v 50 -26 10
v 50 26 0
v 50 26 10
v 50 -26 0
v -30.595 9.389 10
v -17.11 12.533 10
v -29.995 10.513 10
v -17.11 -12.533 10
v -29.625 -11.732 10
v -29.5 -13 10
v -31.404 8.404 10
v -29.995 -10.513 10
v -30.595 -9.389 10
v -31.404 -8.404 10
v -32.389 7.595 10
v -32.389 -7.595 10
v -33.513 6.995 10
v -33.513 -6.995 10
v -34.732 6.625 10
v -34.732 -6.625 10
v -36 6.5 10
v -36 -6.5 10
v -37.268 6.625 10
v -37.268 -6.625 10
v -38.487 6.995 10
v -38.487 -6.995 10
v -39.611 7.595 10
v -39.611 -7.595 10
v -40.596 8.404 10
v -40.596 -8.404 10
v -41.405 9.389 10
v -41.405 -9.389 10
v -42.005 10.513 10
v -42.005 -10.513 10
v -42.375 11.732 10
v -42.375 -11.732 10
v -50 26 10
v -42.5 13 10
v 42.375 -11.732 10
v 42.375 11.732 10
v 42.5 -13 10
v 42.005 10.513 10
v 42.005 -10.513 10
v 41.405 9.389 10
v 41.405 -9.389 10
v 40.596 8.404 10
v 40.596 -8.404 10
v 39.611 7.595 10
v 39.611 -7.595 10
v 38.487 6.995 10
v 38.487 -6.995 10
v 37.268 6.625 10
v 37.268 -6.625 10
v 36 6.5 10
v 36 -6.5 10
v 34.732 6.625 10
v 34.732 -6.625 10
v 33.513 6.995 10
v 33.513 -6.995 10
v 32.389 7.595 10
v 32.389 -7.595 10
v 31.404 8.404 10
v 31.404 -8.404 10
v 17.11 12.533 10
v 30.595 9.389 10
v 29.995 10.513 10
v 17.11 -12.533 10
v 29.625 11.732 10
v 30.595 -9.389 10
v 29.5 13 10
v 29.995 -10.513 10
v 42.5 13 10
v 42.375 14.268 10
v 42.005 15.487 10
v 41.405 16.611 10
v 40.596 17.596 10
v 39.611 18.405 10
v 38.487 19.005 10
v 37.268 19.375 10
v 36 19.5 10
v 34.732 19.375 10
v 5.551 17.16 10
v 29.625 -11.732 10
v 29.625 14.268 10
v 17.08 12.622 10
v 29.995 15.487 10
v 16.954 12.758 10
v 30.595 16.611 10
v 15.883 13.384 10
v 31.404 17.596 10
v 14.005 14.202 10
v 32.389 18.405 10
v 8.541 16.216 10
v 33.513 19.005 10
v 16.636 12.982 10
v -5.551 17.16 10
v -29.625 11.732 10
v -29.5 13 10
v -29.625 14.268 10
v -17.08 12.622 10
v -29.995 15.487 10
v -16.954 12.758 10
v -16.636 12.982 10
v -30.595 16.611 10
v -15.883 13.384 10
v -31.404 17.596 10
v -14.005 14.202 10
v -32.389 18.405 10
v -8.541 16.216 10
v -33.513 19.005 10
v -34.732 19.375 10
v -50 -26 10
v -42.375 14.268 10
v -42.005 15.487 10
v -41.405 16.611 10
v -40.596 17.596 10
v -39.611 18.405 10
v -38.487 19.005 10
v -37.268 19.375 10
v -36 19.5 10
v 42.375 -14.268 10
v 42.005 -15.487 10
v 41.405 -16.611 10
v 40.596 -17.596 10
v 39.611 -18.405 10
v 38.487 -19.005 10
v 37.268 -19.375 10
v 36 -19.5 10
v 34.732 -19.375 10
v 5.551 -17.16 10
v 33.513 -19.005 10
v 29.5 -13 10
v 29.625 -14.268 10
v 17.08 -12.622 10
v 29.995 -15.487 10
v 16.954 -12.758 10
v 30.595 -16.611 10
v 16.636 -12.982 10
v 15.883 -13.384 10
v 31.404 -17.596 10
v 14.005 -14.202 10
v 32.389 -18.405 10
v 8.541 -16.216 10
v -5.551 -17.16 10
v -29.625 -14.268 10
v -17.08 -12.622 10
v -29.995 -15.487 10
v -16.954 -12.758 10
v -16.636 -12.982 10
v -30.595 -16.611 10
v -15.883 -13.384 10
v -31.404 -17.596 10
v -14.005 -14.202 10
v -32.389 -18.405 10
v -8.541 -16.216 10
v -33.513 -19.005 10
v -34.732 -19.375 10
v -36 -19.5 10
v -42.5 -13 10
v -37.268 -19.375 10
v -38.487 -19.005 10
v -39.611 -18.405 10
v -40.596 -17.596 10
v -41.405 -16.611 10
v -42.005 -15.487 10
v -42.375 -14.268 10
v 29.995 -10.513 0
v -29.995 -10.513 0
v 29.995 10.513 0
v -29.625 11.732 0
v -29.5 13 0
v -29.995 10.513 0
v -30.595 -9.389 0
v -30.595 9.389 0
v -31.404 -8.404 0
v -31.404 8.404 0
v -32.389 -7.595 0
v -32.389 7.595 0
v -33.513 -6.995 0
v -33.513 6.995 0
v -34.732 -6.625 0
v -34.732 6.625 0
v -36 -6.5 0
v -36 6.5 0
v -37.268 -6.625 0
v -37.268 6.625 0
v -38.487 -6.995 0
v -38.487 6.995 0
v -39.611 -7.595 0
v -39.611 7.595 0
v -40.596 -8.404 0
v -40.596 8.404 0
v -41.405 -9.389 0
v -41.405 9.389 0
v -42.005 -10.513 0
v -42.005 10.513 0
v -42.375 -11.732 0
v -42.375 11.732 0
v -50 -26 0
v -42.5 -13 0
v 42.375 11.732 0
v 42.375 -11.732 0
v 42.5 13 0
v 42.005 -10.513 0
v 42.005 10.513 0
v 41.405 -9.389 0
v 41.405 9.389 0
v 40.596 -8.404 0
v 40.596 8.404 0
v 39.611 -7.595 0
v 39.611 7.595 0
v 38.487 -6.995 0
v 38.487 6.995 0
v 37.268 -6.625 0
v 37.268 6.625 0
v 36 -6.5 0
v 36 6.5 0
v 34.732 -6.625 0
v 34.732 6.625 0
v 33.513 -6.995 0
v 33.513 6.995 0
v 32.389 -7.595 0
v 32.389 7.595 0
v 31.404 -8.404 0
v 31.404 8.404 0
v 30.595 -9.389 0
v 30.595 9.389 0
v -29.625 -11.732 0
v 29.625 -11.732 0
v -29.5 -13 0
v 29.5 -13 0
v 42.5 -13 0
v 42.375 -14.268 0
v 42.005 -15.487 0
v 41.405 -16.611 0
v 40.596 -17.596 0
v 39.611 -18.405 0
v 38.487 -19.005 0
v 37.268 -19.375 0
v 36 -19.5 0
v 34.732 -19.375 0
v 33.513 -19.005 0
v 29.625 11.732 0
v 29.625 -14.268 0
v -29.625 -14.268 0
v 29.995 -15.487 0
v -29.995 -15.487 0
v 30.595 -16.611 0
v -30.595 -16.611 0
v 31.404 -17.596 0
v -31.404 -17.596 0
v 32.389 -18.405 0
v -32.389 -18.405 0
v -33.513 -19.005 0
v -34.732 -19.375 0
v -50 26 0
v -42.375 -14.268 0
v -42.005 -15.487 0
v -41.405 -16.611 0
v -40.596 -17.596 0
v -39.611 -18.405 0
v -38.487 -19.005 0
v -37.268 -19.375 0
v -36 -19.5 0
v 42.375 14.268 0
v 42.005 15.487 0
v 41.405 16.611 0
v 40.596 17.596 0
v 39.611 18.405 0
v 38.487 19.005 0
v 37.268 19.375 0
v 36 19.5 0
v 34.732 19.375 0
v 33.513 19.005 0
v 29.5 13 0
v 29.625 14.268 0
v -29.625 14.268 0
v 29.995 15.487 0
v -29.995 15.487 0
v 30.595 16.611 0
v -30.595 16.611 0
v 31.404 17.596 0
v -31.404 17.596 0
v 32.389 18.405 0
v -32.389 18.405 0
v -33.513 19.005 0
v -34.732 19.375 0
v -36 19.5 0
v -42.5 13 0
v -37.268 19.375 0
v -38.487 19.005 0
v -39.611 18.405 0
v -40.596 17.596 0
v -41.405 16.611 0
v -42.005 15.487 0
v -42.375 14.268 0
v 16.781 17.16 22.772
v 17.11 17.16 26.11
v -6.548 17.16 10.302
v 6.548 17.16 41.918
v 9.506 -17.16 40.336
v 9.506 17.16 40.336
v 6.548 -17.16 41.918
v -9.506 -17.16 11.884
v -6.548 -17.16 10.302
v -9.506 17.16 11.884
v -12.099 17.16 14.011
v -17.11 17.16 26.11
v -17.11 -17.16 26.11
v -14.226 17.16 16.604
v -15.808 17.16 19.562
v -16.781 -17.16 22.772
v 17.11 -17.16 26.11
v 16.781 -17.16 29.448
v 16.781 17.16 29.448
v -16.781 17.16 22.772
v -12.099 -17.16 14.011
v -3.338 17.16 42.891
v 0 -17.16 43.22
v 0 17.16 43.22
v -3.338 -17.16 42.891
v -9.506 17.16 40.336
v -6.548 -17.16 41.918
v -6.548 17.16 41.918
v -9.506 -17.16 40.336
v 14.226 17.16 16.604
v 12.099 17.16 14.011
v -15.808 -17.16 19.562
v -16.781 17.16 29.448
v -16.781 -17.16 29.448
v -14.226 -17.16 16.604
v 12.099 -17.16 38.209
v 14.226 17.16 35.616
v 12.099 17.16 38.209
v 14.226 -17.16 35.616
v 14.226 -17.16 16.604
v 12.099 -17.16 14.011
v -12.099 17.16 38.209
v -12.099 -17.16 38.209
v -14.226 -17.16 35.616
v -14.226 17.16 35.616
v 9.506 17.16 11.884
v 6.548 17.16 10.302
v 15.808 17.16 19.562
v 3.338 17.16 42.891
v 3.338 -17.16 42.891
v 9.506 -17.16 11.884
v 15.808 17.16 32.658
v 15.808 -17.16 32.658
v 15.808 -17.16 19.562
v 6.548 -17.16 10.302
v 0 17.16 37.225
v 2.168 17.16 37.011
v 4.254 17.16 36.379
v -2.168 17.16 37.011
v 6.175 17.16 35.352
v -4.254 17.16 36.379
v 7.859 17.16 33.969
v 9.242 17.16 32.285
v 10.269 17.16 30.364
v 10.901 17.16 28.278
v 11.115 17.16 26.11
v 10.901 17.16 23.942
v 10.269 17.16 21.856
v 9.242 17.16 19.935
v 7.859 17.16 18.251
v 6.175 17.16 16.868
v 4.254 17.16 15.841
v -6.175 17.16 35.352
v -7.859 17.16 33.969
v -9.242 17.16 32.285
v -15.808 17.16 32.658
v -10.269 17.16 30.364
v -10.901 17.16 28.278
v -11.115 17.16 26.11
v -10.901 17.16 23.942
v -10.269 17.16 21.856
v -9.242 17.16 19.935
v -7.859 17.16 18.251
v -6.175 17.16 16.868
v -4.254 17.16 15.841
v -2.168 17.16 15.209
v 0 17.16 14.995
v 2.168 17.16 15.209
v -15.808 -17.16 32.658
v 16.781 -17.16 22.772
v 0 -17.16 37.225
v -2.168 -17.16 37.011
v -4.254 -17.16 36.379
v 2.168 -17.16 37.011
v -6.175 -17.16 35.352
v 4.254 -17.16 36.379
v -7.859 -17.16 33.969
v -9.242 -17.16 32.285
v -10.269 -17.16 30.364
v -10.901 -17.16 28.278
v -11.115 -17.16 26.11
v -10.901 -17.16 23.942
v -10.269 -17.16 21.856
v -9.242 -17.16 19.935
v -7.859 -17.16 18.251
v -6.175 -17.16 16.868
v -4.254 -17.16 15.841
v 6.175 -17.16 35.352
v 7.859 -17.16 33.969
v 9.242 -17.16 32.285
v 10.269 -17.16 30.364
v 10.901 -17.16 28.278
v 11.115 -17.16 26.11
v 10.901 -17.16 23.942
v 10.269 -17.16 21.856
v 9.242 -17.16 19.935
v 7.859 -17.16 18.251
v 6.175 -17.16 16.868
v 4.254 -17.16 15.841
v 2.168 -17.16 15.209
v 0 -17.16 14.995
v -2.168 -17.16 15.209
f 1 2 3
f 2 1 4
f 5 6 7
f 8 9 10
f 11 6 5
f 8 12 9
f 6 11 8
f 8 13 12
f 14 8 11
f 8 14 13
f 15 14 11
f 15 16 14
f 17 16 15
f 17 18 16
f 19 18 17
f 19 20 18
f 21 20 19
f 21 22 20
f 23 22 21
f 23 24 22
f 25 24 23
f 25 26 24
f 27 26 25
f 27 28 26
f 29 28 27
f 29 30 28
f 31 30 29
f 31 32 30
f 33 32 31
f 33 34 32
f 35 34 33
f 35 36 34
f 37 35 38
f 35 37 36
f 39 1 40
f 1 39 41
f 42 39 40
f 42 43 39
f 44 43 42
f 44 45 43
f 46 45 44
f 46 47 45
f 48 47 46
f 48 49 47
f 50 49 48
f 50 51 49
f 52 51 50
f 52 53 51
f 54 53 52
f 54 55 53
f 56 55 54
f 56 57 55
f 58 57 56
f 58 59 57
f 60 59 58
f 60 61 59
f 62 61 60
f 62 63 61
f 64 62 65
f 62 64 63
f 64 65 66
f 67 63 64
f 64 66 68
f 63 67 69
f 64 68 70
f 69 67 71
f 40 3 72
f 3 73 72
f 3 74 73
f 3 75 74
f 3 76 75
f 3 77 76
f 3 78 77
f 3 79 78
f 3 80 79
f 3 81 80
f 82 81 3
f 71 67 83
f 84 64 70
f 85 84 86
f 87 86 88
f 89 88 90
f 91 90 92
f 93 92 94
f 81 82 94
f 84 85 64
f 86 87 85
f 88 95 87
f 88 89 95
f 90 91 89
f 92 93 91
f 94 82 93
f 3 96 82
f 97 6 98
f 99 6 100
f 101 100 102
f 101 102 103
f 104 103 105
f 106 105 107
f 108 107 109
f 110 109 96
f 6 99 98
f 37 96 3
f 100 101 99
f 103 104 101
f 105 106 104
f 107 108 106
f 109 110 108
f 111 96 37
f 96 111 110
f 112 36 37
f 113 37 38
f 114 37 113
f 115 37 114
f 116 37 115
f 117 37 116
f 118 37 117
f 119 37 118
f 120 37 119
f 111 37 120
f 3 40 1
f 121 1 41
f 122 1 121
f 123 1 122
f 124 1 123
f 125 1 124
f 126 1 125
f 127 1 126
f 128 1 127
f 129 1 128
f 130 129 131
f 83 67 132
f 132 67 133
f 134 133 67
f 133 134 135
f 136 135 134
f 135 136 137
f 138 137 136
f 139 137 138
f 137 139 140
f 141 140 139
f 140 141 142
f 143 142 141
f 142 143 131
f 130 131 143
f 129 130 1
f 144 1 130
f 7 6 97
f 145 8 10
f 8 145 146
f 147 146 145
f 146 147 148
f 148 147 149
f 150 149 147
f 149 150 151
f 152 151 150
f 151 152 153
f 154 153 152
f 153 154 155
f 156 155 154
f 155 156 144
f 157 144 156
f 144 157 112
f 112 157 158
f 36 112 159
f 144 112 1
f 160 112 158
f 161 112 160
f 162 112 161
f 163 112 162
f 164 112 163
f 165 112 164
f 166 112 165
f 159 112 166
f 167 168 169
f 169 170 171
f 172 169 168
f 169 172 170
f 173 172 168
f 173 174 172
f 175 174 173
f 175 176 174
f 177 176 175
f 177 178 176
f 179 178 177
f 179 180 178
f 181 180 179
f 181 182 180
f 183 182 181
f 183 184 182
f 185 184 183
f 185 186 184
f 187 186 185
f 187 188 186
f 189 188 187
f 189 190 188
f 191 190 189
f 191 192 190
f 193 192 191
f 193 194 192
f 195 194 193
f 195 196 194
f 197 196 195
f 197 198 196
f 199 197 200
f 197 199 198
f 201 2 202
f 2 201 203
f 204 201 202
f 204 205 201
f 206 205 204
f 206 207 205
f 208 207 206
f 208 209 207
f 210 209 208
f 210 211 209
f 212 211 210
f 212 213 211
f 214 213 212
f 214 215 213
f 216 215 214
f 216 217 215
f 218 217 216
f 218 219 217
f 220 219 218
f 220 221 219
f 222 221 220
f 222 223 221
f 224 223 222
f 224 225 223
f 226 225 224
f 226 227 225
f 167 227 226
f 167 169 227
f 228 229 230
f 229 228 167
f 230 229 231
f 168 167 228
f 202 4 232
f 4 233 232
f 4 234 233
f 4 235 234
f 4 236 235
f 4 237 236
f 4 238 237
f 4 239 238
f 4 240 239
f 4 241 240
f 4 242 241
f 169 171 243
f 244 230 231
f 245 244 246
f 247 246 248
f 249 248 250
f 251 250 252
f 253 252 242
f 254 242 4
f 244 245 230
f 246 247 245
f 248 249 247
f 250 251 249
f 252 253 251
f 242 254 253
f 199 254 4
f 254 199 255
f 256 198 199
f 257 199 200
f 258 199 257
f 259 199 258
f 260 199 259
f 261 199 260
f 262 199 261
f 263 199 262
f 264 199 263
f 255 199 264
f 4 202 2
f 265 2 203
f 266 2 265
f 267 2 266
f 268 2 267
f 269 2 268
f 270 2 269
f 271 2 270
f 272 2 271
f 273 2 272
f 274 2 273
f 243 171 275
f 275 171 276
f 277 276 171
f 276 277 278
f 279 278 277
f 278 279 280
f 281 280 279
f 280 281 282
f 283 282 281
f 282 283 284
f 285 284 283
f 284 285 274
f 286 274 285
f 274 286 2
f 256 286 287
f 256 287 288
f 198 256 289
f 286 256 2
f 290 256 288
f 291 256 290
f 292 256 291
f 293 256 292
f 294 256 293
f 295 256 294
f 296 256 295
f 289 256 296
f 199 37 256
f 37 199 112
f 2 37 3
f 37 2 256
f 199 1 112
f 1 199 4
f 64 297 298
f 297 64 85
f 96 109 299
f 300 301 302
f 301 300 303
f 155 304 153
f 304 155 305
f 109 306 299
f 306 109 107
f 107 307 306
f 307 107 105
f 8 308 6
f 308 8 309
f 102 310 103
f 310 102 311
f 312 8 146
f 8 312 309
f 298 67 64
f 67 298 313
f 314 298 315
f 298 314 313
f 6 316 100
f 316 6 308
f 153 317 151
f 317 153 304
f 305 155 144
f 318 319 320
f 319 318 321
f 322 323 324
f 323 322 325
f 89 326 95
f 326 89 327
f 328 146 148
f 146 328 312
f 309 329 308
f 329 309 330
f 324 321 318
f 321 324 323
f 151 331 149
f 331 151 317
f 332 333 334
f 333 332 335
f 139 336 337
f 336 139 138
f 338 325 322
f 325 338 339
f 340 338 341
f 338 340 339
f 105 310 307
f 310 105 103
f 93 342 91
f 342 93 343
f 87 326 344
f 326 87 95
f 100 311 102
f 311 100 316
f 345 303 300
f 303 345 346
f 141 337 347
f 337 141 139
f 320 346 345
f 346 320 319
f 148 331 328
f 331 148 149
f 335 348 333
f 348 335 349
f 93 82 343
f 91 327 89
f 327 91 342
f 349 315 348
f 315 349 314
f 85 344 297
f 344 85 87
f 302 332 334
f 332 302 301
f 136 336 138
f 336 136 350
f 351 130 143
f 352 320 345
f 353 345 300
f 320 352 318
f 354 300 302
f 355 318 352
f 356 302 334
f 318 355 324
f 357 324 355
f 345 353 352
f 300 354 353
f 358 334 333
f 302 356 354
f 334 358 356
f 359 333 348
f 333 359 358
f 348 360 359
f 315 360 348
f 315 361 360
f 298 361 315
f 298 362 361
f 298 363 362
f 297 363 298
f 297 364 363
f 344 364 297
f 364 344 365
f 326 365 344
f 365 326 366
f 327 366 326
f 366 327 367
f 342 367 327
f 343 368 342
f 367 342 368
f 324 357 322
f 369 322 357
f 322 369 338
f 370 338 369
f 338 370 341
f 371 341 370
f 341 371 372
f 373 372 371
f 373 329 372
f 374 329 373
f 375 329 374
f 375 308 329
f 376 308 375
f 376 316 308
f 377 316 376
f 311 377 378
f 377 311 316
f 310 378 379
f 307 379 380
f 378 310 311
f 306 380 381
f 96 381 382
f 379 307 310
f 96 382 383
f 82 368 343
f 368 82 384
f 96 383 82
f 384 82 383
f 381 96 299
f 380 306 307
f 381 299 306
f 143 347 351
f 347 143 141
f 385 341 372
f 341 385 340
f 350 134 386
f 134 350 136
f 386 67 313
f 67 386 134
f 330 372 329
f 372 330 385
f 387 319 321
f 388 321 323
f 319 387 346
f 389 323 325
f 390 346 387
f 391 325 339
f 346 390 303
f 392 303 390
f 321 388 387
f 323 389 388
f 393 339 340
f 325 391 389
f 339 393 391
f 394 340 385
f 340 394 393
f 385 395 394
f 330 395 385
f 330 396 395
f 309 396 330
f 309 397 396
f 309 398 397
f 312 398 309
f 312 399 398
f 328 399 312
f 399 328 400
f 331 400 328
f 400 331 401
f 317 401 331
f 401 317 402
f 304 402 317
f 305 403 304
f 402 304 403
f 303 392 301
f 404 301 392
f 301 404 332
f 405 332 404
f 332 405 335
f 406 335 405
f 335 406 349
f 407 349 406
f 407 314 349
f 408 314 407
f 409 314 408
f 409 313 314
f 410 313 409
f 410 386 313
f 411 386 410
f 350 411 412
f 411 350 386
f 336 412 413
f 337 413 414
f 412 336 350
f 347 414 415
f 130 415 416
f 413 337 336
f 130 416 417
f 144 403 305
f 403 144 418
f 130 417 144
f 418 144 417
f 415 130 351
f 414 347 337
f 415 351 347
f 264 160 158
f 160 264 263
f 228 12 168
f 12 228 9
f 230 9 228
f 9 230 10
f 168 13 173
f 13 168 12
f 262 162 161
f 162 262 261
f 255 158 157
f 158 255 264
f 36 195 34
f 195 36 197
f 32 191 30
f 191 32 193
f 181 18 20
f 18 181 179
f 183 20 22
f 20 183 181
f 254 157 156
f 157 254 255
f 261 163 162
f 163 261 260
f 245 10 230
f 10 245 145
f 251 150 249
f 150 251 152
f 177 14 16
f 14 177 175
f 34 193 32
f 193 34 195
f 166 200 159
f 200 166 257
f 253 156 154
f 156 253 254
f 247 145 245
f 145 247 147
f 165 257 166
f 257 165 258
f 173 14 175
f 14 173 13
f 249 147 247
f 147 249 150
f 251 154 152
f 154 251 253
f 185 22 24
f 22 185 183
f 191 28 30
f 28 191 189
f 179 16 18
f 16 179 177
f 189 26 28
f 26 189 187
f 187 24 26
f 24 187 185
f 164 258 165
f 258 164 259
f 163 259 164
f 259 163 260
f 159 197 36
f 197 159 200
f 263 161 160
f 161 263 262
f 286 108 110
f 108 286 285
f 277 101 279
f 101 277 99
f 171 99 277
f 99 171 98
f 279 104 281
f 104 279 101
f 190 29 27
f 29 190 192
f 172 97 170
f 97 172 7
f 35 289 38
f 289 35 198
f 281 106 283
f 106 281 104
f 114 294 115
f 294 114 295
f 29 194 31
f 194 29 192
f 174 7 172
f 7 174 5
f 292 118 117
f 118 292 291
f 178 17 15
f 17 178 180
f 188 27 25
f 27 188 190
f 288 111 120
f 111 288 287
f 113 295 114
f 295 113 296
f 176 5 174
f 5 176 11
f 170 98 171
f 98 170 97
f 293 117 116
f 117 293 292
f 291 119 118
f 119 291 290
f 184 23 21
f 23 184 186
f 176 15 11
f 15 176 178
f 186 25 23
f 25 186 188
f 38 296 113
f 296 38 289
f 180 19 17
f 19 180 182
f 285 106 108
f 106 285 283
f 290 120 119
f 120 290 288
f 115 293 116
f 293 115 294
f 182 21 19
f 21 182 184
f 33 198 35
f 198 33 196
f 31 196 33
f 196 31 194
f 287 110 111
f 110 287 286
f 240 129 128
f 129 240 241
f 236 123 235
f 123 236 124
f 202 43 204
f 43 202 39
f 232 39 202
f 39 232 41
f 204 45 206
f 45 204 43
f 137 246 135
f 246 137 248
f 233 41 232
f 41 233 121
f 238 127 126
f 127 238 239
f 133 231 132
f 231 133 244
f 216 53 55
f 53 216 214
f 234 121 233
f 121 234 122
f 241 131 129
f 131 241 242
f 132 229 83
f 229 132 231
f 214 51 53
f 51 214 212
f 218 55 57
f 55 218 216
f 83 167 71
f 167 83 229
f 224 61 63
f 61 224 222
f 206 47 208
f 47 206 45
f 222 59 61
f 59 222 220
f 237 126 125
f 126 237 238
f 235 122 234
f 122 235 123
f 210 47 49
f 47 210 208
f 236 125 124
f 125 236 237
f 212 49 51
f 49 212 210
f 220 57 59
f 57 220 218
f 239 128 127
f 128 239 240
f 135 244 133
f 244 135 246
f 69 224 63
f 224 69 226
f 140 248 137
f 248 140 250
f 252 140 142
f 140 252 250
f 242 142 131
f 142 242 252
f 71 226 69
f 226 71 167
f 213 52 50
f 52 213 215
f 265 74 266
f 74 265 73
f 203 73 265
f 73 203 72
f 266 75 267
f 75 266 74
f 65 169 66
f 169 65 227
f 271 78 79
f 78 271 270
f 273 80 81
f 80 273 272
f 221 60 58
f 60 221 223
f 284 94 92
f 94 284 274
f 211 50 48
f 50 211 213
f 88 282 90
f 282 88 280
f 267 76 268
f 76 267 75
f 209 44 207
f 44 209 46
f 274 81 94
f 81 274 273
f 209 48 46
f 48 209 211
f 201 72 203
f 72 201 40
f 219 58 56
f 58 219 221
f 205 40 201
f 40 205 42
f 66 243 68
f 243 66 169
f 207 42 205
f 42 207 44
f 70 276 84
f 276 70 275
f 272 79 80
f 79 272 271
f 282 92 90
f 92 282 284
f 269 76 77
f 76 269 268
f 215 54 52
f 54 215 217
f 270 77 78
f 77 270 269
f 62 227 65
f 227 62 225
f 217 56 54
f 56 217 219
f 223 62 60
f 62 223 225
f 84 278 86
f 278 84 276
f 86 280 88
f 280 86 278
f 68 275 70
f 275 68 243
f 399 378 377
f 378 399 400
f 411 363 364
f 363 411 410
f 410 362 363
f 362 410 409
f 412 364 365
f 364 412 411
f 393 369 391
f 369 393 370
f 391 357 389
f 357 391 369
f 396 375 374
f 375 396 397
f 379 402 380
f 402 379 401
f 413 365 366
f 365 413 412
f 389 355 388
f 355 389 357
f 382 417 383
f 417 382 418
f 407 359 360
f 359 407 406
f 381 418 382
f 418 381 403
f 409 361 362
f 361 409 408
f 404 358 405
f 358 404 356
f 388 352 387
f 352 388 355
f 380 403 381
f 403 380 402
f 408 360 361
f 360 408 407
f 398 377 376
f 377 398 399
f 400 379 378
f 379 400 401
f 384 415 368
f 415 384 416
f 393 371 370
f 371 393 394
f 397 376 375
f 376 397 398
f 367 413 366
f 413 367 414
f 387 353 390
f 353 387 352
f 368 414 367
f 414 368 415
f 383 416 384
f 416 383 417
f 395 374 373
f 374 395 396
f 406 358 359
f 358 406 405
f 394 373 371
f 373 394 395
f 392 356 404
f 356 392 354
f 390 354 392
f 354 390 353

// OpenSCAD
$fn = 32;

// ----------------------------------------------------------------------
// Bearing block: 100 x 52 mm base, 22.23 mm bore at 26.11 mm
// ----------------------------------------------------------------------

// --- parameters (mm) ---
base_w = 100;             // base width
base_d = 52;              // base depth
base_t = 10;              // base thickness
bore_d = 22.23;           // shaft / bearing bore
house_r = 17.11;          // housing outer radius
house_len = 34.32;        // housing length along the shaft
foot_w = 34.22;           // foot width under the housing
foot_len = 24.32;         // foot length along the shaft
axis_z = 26.11;           // bore axis height above the base
holes_d = 13;             // mounting holes
hole_x = 36;              // mounting hole spacing

difference() {
  union() {
    /* base plate with its underside on z = 0 */
    translate([0, 0, base_t / 2]) cube([base_w, base_d, base_t], center = true);
    /* hull foot: a straight web blending into the round housing */
    hull() {
      translate([0, 0, base_t - 0.5]) cube([foot_w, foot_len, 1.6], center = true);
      translate([0, 0, axis_z]) rotate([-90, 0, 0]) cylinder(h = house_len, d = 2 * house_r, center = true);
    }
  }
  /* bore through the housing, 2.5 mm clear on both sides */
  translate([0, 0, axis_z]) rotate([-90, 0, 0]) cylinder(h = house_len + 5, d = bore_d, center = true);
  /* mounting holes through the base plate */
  for (hx = [-36, 36]) {
    for (hy = [-13, 13]) {
      translate([hx, hy, -2.5]) cylinder(h = base_t + 5, d = holes_d);
    }
  }
}
